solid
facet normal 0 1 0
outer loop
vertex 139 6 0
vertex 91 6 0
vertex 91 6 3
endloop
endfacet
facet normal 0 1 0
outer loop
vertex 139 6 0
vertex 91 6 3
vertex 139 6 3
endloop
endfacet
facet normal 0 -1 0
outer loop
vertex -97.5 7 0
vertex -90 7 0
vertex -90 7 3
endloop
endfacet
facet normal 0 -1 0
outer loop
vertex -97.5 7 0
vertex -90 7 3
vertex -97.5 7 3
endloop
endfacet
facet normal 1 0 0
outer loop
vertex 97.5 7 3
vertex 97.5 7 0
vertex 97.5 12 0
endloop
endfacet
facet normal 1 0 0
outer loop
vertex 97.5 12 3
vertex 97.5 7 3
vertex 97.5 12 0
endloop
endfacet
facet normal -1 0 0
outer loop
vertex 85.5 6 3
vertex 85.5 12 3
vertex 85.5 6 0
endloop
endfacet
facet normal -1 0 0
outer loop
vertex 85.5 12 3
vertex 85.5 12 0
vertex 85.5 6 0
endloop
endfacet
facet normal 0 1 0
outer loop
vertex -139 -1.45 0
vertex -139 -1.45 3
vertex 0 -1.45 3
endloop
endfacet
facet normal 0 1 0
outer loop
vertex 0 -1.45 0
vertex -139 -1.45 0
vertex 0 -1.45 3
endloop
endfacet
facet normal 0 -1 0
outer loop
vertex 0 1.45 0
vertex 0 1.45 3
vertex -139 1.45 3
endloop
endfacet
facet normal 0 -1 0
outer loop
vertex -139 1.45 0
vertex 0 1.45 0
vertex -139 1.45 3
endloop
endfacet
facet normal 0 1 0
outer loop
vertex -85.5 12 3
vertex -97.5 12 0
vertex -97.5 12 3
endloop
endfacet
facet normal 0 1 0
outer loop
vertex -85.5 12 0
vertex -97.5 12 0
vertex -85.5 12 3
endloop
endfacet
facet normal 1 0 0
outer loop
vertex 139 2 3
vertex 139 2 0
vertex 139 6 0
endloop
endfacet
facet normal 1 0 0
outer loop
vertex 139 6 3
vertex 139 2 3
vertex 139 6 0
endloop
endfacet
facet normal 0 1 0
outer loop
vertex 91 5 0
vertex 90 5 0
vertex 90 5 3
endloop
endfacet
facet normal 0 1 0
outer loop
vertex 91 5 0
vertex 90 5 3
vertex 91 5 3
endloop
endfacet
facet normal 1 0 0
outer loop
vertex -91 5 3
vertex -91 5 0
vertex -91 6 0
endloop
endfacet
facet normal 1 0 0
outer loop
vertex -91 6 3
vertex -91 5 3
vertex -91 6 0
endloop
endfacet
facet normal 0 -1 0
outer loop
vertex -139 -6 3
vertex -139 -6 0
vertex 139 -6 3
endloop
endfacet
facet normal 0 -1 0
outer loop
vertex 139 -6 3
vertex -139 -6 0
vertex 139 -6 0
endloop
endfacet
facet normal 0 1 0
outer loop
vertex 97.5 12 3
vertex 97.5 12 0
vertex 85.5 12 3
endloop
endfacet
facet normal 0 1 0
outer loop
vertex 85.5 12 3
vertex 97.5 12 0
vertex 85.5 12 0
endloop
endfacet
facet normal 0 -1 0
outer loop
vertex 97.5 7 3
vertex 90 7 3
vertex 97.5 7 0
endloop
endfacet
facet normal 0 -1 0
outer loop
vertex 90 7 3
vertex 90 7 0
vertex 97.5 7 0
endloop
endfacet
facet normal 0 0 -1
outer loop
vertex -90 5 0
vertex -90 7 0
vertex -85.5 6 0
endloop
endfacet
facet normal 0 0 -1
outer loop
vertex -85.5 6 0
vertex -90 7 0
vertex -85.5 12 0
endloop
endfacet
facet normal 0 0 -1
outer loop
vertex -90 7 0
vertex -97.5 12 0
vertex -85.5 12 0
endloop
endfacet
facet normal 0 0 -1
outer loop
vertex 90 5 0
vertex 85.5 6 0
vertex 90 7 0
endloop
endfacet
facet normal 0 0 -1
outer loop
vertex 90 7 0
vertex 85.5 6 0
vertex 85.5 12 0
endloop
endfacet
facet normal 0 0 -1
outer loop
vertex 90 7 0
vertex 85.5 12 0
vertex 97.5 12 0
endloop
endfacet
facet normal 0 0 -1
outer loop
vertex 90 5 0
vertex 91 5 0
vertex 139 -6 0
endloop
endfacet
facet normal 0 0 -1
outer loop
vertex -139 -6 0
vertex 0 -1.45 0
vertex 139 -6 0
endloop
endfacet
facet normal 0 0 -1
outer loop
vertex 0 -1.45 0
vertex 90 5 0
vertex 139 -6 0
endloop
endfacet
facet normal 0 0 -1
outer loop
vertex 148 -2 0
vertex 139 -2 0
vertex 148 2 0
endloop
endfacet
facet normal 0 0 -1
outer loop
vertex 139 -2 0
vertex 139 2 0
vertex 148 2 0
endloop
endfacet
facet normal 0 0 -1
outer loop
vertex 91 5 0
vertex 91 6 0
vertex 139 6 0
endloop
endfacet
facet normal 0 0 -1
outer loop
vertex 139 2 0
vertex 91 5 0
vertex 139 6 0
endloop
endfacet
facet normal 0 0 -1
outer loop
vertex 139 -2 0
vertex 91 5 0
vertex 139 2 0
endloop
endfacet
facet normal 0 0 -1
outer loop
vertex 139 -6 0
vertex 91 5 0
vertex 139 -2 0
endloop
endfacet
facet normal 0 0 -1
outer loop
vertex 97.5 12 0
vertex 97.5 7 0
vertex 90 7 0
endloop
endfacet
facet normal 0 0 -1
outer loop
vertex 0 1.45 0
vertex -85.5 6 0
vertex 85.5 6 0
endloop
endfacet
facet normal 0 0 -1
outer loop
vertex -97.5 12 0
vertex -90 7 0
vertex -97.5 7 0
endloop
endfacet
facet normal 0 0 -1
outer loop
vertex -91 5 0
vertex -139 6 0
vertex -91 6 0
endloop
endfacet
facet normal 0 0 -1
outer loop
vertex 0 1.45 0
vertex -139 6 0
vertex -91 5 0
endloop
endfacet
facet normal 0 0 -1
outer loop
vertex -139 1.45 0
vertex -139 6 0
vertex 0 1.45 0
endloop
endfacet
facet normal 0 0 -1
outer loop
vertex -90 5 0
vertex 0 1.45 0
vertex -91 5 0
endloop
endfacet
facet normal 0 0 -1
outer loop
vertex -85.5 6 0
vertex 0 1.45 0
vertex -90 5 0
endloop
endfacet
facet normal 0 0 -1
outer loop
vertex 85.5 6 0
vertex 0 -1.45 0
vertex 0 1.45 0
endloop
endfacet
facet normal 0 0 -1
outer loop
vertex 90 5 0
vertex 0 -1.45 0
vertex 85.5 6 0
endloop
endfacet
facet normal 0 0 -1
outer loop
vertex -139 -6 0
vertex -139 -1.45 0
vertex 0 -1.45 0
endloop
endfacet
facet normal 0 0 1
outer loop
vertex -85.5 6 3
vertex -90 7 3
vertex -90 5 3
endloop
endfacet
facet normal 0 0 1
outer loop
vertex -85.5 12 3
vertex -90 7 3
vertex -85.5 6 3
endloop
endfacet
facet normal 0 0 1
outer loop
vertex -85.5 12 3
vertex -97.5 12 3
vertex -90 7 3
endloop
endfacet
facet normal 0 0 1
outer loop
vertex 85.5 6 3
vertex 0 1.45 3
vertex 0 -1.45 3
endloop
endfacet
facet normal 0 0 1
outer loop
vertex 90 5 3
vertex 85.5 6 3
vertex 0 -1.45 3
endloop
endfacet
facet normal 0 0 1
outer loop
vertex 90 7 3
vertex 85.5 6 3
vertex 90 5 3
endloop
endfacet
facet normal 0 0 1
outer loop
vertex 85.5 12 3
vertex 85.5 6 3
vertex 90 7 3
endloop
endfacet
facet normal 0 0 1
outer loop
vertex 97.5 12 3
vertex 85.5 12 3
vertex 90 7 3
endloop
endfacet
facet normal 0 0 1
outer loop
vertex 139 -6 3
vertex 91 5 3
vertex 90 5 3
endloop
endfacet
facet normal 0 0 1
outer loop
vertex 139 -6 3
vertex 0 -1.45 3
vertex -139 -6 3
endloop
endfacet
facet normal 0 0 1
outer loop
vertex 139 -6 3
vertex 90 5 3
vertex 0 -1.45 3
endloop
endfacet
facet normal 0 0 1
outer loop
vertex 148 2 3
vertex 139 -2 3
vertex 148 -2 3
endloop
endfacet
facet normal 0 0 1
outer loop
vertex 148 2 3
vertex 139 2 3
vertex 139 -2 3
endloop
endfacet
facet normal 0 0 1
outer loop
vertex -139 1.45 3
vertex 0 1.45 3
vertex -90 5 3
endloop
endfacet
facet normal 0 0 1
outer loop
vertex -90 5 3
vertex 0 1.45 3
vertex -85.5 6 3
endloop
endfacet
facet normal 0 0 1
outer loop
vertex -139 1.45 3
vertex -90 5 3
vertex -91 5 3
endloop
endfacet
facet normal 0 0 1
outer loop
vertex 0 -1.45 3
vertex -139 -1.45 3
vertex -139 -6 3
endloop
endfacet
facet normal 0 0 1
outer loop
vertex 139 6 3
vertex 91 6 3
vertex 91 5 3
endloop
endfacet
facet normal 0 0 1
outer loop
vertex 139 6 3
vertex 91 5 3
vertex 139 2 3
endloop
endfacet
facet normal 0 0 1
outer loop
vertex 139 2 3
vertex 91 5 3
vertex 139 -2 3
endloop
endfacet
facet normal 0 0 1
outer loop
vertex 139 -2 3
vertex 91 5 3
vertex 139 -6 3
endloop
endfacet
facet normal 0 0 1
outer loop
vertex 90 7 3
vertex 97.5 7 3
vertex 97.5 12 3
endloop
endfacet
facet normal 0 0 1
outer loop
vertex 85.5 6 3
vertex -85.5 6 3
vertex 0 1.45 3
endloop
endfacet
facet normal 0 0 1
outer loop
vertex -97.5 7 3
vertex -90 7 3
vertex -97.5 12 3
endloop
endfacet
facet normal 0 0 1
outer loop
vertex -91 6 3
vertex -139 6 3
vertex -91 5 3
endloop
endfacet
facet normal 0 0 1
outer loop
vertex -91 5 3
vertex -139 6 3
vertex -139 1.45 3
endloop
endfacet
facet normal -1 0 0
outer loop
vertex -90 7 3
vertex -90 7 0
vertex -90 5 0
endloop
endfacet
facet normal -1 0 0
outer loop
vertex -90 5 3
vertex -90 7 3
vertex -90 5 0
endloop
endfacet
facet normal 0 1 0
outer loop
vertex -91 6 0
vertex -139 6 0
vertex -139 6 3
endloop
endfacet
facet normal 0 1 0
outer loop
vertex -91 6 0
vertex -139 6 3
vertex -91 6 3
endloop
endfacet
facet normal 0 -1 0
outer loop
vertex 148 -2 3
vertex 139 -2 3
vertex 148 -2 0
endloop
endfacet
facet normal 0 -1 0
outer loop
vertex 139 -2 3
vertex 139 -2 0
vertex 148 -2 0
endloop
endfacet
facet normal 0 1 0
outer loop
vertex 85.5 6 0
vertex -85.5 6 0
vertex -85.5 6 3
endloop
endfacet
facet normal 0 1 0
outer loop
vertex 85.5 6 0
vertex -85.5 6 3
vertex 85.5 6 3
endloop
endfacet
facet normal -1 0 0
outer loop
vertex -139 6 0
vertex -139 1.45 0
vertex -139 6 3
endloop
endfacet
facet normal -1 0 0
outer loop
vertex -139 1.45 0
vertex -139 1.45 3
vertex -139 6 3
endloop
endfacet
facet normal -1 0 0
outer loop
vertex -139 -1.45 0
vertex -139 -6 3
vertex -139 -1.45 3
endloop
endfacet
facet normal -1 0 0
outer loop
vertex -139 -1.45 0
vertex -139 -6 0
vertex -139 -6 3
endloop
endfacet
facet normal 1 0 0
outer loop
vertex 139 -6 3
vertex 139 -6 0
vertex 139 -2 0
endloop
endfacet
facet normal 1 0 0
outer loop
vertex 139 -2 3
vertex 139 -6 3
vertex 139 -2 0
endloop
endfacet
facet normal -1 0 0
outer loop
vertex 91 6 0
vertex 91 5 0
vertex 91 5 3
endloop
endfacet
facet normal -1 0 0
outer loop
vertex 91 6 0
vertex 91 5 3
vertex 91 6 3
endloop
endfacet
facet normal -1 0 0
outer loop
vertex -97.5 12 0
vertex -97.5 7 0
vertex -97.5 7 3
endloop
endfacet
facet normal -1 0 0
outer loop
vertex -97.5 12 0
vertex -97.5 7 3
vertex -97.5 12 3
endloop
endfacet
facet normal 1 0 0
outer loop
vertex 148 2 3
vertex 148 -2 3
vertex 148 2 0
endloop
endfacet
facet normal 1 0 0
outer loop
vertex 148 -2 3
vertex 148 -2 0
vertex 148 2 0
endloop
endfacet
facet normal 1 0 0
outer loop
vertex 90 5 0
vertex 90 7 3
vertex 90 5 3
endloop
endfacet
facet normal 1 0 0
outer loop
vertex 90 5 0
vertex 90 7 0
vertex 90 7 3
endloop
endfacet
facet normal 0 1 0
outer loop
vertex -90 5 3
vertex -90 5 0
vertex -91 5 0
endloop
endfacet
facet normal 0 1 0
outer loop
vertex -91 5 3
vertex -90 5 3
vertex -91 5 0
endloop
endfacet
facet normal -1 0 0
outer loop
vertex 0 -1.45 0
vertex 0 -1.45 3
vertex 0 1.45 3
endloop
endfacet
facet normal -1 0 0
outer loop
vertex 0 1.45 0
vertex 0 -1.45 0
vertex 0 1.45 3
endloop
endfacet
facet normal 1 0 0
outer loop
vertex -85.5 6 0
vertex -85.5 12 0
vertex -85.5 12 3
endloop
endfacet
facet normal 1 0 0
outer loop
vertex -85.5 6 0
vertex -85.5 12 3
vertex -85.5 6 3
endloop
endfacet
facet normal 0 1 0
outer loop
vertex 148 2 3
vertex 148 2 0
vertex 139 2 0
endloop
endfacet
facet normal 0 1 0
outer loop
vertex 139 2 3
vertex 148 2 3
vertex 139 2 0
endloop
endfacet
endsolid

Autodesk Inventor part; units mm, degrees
ref_plane "YZ Plane" through (0, 0, 0) normal (1, 0, 0) x (0, 1, 0)
ref_plane "XY Plane" through (0, 0, 0) normal (0, 0, 1) x (1, 0, 0)
sketch "草圖1" plane through (0, 0, 0) normal (0, 0, 1) x (1, 0, 0)
  line L0 (0, 6) -> (0, -6)
  line L1 (0, -6) -> (-139, -6)
  line L2 (-139, -6) -> (-139, 6)
  line L3 (-148, 2) -> (-139, 2)
  line L4 (-139, 2) -> (-139, -2)
  line L5 (-139, -2) -> (-148, -2)
  line L6 (-148, -2) -> (-148, 2)
  line L7 (-207.2, 0) -> (207.2, 0) projected
  line L8 (0, -9.6) -> (0, 15.6) projected
  line L9 (0, -6) -> (139, -6)
  line L10 (139, -6) -> (139, 6)
  line L11 (148, 2) -> (139, 2)
  line L12 (139, -2) -> (148, -2)
  line L13 (148, -2) -> (148, 2)
  line L14 (-148, -2) -> (-139, -2)
  line L15 (-139, -2) -> (-139, -6)
  line L16 (139, -6) -> (139, -2)
  line L17 (139, -2) -> (148, -2)
  line L18 (148, -2) -> (148, 2)
  line L19 (148, 2) -> (139, 2)
  line L20 (139, 2) -> (139, 6)
  line L21 (-139, 6) -> (-139, 2)
  line L22 (-139, 2) -> (-148, 2)
  line L23 (-148, 2) -> (-148, -2)
  line L24 (-97.5, 7) -> (-97.5, 12)
  line L25 (-97.5, 12) -> (-87.5, 12)
  line L26 (-90, 7) -> (-97.5, 7)
  line L27 (-90, 7) -> (-90, 5)
  line L28 (-90, 5) -> (-91, 5)
  line L29 (-91, 5) -> (-91, 6)
  line L30 (97.5, 7) -> (97.5, 12)
  line L31 (97.5, 12) -> (87.5, 12)
  line L32 (90, 7) -> (97.5, 7)
  line L33 (90, 7) -> (90, 5)
  line L34 (90, 5) -> (91, 5)
  line L35 (91, 5) -> (91, 6)
  line L36 (-139, 6) -> (-91, 6)
  line L37 (-85.5, 6) -> (85.5, 6)
  line L38 (91, 6) -> (139, 6)
  line L39 (-87.5, 12) -> (-85.5, 12)
  line L40 (-85.5, 12) -> (-85.5, 6)
  line L41 (87.5, 12) -> (85.5, 12)
  line L42 (85.5, 12) -> (85.5, 6)
  point P0 (0, 0)
  point P1 (-139, 2)
  dimension "d2" = 4
  dimension "d13" = 2
  dimension "d14" = 2
  dimension "d17" = 12
extrude "擠出1" add sketch "草圖1" along normal blind 3
ref_plane "工作平面1" through (0, 0, 1.5) normal (0, 0, 1) x (1, 0, 0)
sketch "草圖7" plane through (0, 0, 3) normal (0, 0, 1) x (1, 0, 0)
  line L0 (0, 1.45) -> (-139, 1.45)
  line L1 (-139, 1.45) -> (-139, -1.45)
  line L2 (-139, -1.45) -> (0, -1.45)
  line L3 (0, -1.45) -> (0, 1.45)
  line L4 (91, 6) -> (91, 5) projected
  line L5 (91, 5) -> (90, 5) projected
  line L6 (90, 5) -> (90, 7) projected
  line L7 (90, 7) -> (97.5, 7) projected
  line L8 (97.5, 7) -> (97.5, 12) projected
  line L9 (97.5, 12) -> (85.5, 12) projected
  line L10 (85.5, 12) -> (85.5, 6) projected
  line L11 (85.5, 6) -> (-85.5, 6) projected
  line L12 (-85.5, 6) -> (-85.5, 12) projected
  line L13 (-85.5, 12) -> (-97.5, 12) projected
  line L14 (-97.5, 12) -> (-97.5, 7) projected
  line L15 (-97.5, 7) -> (-90, 7) projected
  line L16 (-90, 7) -> (-90, 5) projected
  line L17 (-90, 5) -> (-91, 5) projected
  line L18 (-91, 5) -> (-91, 6) projected
  line L19 (-91, 6) -> (-139, 6) projected
  line L20 (-139, 6) -> (-139, 2) projected
  line L21 (-139, 2) -> (-148, 2) projected
  line L22 (-148, 2) -> (-148, -2) projected
  line L23 (-148, -2) -> (-139, -2) projected
  line L24 (-139, -2) -> (-139, -6) projected
  line L25 (-139, -6) -> (139, -6) projected
  line L26 (139, -6) -> (139, -2) projected
  line L27 (139, -2) -> (148, -2) projected
  line L28 (148, -2) -> (148, 2) projected
  line L29 (148, 2) -> (139, 2) projected
  line L30 (139, 2) -> (139, 6) projected
  line L31 (139, 6) -> (91, 6) projected
  line L32 (-139, 1.45) -> (-139, 2)
  line L33 (-148, -2) -> (-139, -2) projected
  line L34 (-139, -1.45) -> (-139, -2)
  point P0 (0, 0)
  point P1 (0, 0)
  dimension "d39" = 139
  dimension "d40" = 2.9
extrude "擠出5" cut sketch "草圖7" against normal up to surface (3 mm away) contours L3 L2 L1 L0 | L1 L34 L23 L22 L21 L32
properties part number "rod_6"
